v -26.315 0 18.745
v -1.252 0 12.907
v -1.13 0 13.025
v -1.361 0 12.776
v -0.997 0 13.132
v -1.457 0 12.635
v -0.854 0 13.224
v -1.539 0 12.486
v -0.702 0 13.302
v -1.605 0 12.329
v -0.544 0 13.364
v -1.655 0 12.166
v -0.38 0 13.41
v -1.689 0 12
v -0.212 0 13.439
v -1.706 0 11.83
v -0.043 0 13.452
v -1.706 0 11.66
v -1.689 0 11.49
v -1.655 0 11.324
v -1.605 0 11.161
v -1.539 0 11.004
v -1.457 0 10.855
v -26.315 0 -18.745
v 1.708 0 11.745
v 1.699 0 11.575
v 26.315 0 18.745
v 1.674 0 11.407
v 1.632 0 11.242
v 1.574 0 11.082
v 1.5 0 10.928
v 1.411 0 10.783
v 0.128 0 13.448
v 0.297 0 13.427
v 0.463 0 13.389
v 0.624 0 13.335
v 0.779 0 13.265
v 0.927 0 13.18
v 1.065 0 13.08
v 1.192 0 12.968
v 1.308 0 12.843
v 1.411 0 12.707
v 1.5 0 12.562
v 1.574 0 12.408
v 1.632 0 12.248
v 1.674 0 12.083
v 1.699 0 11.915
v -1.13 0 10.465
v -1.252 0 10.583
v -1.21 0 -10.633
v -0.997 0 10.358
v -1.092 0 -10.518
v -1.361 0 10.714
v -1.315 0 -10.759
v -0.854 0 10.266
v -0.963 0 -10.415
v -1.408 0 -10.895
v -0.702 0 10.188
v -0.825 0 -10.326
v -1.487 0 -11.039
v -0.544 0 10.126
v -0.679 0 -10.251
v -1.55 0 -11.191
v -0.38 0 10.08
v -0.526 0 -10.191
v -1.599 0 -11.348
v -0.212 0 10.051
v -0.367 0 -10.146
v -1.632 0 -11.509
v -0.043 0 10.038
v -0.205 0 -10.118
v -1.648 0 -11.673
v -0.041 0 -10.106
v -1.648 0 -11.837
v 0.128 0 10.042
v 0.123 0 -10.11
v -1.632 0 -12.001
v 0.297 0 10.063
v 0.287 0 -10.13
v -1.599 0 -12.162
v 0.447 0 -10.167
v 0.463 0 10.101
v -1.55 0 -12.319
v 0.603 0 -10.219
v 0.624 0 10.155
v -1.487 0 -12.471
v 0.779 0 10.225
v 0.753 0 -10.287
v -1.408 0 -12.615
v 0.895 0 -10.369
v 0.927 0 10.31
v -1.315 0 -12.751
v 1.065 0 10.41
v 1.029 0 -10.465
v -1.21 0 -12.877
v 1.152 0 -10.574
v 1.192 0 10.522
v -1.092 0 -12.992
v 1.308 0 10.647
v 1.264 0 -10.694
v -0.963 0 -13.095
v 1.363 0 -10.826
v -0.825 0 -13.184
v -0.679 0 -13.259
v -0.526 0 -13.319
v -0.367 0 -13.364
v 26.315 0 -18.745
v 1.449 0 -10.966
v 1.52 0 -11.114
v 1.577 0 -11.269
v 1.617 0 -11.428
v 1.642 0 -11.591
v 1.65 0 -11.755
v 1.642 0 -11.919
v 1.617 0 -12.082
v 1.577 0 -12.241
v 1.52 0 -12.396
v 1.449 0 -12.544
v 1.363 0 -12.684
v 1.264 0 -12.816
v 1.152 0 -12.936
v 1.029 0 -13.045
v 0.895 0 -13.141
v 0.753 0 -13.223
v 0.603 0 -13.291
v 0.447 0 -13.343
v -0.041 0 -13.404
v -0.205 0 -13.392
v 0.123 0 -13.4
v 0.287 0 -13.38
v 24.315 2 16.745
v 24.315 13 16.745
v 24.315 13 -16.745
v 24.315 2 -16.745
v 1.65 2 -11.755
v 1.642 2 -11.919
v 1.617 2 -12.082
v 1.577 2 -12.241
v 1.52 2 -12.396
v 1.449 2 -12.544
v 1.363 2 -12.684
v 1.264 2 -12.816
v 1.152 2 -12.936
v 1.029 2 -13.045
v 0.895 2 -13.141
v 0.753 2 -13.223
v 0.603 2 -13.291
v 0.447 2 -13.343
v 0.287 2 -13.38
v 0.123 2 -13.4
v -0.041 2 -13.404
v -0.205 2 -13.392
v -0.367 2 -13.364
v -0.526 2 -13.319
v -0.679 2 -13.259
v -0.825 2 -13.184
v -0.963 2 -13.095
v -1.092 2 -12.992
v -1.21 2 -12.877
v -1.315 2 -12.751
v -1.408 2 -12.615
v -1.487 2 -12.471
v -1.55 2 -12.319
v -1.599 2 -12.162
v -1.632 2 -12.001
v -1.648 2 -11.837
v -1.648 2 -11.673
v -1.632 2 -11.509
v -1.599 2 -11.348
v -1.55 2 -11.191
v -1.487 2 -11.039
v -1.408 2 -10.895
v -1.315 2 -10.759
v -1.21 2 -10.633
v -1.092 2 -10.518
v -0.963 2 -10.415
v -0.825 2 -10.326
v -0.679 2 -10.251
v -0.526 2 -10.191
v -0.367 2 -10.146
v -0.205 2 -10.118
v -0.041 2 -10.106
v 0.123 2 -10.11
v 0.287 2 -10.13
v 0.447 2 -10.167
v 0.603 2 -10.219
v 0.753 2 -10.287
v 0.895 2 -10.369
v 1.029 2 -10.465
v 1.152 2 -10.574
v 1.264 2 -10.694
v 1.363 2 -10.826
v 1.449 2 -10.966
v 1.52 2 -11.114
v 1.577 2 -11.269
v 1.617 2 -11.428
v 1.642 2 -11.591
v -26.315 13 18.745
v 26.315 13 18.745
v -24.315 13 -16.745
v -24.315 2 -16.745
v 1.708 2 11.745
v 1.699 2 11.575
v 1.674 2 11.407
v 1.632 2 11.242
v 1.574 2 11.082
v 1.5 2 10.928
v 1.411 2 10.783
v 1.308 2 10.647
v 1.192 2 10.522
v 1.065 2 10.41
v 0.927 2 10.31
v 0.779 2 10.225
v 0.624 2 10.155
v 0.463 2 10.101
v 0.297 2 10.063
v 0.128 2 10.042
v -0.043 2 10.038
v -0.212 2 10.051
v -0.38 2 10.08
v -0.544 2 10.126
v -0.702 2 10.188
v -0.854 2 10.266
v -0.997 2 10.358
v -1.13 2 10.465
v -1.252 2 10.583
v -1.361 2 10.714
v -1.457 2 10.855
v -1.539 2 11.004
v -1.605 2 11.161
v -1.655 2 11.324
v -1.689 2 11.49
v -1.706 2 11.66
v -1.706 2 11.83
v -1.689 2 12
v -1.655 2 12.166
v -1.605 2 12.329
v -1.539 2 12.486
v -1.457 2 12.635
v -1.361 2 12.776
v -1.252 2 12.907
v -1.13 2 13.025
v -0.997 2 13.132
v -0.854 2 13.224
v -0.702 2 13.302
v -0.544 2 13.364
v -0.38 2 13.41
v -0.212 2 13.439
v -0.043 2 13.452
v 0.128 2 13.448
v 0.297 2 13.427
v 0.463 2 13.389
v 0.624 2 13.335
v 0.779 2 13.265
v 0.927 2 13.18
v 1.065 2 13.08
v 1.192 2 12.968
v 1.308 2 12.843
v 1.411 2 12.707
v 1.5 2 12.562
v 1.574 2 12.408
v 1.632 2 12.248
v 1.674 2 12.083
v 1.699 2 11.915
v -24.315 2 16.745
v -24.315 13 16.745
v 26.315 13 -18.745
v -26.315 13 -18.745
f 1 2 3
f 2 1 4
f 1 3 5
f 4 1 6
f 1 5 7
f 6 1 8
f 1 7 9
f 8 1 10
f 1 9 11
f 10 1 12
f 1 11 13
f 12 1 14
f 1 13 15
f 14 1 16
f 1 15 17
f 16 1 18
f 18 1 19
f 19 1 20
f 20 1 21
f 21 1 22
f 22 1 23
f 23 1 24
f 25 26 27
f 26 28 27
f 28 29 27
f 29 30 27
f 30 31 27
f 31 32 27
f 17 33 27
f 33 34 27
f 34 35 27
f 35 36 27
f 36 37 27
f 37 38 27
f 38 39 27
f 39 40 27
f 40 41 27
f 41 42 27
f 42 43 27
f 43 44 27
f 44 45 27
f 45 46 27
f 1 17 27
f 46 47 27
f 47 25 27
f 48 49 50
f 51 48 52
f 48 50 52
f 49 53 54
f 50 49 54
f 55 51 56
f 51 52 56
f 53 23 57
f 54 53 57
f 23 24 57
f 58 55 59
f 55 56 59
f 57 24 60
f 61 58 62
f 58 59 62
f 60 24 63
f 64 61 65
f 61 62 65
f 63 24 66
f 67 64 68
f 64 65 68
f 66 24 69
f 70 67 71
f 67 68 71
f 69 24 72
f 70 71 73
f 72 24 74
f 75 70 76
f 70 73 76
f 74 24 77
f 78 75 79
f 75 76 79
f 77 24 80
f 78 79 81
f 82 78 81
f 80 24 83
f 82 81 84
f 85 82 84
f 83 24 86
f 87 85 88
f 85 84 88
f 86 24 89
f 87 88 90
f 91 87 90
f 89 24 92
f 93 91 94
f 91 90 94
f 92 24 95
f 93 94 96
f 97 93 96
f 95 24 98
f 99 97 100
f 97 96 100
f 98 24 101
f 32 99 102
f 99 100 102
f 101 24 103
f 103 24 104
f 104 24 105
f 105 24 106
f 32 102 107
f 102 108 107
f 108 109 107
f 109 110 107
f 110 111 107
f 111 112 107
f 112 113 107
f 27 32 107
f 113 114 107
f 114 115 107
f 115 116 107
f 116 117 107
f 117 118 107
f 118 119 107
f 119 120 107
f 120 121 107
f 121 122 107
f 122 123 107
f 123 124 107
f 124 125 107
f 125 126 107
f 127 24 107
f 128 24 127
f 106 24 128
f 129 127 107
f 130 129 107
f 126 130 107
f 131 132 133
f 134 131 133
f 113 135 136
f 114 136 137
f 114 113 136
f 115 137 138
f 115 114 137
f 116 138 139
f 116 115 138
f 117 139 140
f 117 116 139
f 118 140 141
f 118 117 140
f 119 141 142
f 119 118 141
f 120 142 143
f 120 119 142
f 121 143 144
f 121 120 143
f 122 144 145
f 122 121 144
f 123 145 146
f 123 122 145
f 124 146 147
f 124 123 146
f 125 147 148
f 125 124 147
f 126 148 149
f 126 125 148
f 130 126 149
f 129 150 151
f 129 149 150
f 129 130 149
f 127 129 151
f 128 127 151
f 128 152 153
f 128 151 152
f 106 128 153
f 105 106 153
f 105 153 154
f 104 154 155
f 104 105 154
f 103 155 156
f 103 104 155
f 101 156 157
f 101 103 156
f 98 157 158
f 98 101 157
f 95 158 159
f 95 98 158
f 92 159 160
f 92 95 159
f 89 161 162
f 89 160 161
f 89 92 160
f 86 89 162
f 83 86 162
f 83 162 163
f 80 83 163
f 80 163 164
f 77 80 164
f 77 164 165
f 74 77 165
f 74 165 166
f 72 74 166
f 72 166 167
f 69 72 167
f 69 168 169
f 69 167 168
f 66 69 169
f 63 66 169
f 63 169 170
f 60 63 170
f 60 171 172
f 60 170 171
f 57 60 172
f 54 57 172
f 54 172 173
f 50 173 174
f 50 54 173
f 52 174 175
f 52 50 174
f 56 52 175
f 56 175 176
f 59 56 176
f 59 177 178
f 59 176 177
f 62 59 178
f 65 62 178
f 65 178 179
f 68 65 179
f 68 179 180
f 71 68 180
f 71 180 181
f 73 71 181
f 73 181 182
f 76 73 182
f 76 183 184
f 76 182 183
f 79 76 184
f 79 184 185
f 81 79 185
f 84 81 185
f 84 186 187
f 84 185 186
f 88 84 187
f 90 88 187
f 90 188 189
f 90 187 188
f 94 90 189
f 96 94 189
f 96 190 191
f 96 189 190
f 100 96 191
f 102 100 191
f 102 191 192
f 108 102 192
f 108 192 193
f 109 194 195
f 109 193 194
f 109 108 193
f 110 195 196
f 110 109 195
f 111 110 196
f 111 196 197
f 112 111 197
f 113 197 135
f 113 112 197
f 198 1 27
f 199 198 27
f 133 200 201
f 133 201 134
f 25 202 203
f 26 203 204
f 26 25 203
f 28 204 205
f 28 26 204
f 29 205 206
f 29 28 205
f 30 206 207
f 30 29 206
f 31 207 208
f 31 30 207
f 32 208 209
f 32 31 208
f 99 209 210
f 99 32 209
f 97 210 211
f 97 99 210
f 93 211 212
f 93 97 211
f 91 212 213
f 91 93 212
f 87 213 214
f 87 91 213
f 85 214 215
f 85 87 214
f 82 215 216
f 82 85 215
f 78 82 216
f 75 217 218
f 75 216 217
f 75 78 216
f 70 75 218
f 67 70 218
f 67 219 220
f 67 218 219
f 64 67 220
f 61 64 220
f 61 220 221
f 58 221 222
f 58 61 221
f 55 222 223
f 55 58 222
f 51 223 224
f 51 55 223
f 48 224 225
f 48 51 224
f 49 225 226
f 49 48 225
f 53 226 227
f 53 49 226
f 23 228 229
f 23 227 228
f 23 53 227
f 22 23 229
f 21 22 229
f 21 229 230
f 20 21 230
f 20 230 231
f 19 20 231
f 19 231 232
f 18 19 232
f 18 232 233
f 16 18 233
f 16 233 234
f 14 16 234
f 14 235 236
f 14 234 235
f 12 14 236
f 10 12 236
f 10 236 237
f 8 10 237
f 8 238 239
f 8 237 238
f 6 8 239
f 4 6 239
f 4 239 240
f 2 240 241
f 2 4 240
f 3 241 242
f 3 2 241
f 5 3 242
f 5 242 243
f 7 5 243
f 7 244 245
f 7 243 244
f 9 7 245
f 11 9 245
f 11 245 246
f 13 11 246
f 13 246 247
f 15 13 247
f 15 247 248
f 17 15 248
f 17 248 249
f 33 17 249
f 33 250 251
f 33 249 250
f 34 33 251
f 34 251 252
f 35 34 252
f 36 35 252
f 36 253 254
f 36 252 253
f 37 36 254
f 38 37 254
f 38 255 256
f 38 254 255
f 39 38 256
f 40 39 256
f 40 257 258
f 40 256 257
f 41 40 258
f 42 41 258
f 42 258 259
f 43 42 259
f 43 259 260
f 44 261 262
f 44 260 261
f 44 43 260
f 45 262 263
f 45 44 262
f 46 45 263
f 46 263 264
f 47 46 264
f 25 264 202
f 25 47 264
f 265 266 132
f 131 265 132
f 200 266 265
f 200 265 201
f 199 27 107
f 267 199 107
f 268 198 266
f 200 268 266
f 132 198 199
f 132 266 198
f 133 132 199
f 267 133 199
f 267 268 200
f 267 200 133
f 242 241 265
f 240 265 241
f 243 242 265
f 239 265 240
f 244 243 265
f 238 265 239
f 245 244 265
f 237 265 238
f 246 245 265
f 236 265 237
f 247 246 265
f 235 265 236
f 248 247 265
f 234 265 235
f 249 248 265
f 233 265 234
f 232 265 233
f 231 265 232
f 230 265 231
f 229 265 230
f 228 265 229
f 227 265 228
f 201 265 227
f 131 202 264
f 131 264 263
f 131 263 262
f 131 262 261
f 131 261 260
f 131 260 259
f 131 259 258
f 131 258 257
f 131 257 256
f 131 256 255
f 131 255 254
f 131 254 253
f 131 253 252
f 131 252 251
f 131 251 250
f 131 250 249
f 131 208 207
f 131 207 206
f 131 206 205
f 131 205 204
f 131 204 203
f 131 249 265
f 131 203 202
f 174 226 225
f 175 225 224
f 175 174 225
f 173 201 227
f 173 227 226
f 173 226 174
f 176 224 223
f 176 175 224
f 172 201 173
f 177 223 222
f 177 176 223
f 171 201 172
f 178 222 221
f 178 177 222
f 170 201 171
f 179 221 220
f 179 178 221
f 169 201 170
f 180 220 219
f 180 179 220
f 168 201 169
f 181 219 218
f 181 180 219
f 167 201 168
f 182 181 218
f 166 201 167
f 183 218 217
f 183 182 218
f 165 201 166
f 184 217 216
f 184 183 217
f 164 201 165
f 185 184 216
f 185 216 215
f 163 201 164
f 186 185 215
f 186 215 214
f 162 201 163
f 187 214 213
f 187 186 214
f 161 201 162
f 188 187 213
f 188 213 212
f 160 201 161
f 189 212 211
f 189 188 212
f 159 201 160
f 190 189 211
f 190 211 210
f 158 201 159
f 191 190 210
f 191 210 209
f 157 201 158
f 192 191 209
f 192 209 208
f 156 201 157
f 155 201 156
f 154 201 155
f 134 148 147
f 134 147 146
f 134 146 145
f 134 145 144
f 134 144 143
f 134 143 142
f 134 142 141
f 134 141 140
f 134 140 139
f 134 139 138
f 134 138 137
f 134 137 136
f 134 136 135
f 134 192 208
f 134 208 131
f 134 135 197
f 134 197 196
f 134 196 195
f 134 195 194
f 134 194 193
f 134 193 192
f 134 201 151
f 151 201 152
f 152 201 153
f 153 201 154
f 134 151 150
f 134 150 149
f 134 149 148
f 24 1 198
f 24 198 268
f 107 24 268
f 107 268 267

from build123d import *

# Parameters (mm, degrees)
SKETCH1_W           = 52.63
SKETCH1_H           = 37.49
SKETCH1_R           = 1.65
SKETCH1_R_2         = 1.707739437
BOSS_EXTRUDE1_DEPTH = 13
SKETCH3_W           = 48.63
SKETCH3_H           = 33.49
CUT_EXTRUDE2_DEPTH  = 11


with BuildPart() as part:
    # Sketch1 → Boss-Extrude1 (new body)
    with BuildSketch(Plane(origin=(0, 0, 0), x_dir=(1, 0, 0), z_dir=(0, 1, 0))):
        Rectangle(SKETCH1_W, SKETCH1_H)
        with Locations((0, 11.755)):
            Circle(SKETCH1_R, mode=Mode.SUBTRACT)
        with Locations((0, -11.745)):
            Circle(SKETCH1_R_2, mode=Mode.SUBTRACT)
    extrude(amount=BOSS_EXTRUDE1_DEPTH)

    # Sketch3 → Cut-Extrude2 (cut)
    with BuildSketch(Plane(origin=(0, 13, 0), x_dir=(1, 0, 0), z_dir=(0, 1, 0))):
        Rectangle(SKETCH3_W, SKETCH3_H)
    extrude(amount=-CUT_EXTRUDE2_DEPTH, mode=Mode.SUBTRACT)


solid = part.part
